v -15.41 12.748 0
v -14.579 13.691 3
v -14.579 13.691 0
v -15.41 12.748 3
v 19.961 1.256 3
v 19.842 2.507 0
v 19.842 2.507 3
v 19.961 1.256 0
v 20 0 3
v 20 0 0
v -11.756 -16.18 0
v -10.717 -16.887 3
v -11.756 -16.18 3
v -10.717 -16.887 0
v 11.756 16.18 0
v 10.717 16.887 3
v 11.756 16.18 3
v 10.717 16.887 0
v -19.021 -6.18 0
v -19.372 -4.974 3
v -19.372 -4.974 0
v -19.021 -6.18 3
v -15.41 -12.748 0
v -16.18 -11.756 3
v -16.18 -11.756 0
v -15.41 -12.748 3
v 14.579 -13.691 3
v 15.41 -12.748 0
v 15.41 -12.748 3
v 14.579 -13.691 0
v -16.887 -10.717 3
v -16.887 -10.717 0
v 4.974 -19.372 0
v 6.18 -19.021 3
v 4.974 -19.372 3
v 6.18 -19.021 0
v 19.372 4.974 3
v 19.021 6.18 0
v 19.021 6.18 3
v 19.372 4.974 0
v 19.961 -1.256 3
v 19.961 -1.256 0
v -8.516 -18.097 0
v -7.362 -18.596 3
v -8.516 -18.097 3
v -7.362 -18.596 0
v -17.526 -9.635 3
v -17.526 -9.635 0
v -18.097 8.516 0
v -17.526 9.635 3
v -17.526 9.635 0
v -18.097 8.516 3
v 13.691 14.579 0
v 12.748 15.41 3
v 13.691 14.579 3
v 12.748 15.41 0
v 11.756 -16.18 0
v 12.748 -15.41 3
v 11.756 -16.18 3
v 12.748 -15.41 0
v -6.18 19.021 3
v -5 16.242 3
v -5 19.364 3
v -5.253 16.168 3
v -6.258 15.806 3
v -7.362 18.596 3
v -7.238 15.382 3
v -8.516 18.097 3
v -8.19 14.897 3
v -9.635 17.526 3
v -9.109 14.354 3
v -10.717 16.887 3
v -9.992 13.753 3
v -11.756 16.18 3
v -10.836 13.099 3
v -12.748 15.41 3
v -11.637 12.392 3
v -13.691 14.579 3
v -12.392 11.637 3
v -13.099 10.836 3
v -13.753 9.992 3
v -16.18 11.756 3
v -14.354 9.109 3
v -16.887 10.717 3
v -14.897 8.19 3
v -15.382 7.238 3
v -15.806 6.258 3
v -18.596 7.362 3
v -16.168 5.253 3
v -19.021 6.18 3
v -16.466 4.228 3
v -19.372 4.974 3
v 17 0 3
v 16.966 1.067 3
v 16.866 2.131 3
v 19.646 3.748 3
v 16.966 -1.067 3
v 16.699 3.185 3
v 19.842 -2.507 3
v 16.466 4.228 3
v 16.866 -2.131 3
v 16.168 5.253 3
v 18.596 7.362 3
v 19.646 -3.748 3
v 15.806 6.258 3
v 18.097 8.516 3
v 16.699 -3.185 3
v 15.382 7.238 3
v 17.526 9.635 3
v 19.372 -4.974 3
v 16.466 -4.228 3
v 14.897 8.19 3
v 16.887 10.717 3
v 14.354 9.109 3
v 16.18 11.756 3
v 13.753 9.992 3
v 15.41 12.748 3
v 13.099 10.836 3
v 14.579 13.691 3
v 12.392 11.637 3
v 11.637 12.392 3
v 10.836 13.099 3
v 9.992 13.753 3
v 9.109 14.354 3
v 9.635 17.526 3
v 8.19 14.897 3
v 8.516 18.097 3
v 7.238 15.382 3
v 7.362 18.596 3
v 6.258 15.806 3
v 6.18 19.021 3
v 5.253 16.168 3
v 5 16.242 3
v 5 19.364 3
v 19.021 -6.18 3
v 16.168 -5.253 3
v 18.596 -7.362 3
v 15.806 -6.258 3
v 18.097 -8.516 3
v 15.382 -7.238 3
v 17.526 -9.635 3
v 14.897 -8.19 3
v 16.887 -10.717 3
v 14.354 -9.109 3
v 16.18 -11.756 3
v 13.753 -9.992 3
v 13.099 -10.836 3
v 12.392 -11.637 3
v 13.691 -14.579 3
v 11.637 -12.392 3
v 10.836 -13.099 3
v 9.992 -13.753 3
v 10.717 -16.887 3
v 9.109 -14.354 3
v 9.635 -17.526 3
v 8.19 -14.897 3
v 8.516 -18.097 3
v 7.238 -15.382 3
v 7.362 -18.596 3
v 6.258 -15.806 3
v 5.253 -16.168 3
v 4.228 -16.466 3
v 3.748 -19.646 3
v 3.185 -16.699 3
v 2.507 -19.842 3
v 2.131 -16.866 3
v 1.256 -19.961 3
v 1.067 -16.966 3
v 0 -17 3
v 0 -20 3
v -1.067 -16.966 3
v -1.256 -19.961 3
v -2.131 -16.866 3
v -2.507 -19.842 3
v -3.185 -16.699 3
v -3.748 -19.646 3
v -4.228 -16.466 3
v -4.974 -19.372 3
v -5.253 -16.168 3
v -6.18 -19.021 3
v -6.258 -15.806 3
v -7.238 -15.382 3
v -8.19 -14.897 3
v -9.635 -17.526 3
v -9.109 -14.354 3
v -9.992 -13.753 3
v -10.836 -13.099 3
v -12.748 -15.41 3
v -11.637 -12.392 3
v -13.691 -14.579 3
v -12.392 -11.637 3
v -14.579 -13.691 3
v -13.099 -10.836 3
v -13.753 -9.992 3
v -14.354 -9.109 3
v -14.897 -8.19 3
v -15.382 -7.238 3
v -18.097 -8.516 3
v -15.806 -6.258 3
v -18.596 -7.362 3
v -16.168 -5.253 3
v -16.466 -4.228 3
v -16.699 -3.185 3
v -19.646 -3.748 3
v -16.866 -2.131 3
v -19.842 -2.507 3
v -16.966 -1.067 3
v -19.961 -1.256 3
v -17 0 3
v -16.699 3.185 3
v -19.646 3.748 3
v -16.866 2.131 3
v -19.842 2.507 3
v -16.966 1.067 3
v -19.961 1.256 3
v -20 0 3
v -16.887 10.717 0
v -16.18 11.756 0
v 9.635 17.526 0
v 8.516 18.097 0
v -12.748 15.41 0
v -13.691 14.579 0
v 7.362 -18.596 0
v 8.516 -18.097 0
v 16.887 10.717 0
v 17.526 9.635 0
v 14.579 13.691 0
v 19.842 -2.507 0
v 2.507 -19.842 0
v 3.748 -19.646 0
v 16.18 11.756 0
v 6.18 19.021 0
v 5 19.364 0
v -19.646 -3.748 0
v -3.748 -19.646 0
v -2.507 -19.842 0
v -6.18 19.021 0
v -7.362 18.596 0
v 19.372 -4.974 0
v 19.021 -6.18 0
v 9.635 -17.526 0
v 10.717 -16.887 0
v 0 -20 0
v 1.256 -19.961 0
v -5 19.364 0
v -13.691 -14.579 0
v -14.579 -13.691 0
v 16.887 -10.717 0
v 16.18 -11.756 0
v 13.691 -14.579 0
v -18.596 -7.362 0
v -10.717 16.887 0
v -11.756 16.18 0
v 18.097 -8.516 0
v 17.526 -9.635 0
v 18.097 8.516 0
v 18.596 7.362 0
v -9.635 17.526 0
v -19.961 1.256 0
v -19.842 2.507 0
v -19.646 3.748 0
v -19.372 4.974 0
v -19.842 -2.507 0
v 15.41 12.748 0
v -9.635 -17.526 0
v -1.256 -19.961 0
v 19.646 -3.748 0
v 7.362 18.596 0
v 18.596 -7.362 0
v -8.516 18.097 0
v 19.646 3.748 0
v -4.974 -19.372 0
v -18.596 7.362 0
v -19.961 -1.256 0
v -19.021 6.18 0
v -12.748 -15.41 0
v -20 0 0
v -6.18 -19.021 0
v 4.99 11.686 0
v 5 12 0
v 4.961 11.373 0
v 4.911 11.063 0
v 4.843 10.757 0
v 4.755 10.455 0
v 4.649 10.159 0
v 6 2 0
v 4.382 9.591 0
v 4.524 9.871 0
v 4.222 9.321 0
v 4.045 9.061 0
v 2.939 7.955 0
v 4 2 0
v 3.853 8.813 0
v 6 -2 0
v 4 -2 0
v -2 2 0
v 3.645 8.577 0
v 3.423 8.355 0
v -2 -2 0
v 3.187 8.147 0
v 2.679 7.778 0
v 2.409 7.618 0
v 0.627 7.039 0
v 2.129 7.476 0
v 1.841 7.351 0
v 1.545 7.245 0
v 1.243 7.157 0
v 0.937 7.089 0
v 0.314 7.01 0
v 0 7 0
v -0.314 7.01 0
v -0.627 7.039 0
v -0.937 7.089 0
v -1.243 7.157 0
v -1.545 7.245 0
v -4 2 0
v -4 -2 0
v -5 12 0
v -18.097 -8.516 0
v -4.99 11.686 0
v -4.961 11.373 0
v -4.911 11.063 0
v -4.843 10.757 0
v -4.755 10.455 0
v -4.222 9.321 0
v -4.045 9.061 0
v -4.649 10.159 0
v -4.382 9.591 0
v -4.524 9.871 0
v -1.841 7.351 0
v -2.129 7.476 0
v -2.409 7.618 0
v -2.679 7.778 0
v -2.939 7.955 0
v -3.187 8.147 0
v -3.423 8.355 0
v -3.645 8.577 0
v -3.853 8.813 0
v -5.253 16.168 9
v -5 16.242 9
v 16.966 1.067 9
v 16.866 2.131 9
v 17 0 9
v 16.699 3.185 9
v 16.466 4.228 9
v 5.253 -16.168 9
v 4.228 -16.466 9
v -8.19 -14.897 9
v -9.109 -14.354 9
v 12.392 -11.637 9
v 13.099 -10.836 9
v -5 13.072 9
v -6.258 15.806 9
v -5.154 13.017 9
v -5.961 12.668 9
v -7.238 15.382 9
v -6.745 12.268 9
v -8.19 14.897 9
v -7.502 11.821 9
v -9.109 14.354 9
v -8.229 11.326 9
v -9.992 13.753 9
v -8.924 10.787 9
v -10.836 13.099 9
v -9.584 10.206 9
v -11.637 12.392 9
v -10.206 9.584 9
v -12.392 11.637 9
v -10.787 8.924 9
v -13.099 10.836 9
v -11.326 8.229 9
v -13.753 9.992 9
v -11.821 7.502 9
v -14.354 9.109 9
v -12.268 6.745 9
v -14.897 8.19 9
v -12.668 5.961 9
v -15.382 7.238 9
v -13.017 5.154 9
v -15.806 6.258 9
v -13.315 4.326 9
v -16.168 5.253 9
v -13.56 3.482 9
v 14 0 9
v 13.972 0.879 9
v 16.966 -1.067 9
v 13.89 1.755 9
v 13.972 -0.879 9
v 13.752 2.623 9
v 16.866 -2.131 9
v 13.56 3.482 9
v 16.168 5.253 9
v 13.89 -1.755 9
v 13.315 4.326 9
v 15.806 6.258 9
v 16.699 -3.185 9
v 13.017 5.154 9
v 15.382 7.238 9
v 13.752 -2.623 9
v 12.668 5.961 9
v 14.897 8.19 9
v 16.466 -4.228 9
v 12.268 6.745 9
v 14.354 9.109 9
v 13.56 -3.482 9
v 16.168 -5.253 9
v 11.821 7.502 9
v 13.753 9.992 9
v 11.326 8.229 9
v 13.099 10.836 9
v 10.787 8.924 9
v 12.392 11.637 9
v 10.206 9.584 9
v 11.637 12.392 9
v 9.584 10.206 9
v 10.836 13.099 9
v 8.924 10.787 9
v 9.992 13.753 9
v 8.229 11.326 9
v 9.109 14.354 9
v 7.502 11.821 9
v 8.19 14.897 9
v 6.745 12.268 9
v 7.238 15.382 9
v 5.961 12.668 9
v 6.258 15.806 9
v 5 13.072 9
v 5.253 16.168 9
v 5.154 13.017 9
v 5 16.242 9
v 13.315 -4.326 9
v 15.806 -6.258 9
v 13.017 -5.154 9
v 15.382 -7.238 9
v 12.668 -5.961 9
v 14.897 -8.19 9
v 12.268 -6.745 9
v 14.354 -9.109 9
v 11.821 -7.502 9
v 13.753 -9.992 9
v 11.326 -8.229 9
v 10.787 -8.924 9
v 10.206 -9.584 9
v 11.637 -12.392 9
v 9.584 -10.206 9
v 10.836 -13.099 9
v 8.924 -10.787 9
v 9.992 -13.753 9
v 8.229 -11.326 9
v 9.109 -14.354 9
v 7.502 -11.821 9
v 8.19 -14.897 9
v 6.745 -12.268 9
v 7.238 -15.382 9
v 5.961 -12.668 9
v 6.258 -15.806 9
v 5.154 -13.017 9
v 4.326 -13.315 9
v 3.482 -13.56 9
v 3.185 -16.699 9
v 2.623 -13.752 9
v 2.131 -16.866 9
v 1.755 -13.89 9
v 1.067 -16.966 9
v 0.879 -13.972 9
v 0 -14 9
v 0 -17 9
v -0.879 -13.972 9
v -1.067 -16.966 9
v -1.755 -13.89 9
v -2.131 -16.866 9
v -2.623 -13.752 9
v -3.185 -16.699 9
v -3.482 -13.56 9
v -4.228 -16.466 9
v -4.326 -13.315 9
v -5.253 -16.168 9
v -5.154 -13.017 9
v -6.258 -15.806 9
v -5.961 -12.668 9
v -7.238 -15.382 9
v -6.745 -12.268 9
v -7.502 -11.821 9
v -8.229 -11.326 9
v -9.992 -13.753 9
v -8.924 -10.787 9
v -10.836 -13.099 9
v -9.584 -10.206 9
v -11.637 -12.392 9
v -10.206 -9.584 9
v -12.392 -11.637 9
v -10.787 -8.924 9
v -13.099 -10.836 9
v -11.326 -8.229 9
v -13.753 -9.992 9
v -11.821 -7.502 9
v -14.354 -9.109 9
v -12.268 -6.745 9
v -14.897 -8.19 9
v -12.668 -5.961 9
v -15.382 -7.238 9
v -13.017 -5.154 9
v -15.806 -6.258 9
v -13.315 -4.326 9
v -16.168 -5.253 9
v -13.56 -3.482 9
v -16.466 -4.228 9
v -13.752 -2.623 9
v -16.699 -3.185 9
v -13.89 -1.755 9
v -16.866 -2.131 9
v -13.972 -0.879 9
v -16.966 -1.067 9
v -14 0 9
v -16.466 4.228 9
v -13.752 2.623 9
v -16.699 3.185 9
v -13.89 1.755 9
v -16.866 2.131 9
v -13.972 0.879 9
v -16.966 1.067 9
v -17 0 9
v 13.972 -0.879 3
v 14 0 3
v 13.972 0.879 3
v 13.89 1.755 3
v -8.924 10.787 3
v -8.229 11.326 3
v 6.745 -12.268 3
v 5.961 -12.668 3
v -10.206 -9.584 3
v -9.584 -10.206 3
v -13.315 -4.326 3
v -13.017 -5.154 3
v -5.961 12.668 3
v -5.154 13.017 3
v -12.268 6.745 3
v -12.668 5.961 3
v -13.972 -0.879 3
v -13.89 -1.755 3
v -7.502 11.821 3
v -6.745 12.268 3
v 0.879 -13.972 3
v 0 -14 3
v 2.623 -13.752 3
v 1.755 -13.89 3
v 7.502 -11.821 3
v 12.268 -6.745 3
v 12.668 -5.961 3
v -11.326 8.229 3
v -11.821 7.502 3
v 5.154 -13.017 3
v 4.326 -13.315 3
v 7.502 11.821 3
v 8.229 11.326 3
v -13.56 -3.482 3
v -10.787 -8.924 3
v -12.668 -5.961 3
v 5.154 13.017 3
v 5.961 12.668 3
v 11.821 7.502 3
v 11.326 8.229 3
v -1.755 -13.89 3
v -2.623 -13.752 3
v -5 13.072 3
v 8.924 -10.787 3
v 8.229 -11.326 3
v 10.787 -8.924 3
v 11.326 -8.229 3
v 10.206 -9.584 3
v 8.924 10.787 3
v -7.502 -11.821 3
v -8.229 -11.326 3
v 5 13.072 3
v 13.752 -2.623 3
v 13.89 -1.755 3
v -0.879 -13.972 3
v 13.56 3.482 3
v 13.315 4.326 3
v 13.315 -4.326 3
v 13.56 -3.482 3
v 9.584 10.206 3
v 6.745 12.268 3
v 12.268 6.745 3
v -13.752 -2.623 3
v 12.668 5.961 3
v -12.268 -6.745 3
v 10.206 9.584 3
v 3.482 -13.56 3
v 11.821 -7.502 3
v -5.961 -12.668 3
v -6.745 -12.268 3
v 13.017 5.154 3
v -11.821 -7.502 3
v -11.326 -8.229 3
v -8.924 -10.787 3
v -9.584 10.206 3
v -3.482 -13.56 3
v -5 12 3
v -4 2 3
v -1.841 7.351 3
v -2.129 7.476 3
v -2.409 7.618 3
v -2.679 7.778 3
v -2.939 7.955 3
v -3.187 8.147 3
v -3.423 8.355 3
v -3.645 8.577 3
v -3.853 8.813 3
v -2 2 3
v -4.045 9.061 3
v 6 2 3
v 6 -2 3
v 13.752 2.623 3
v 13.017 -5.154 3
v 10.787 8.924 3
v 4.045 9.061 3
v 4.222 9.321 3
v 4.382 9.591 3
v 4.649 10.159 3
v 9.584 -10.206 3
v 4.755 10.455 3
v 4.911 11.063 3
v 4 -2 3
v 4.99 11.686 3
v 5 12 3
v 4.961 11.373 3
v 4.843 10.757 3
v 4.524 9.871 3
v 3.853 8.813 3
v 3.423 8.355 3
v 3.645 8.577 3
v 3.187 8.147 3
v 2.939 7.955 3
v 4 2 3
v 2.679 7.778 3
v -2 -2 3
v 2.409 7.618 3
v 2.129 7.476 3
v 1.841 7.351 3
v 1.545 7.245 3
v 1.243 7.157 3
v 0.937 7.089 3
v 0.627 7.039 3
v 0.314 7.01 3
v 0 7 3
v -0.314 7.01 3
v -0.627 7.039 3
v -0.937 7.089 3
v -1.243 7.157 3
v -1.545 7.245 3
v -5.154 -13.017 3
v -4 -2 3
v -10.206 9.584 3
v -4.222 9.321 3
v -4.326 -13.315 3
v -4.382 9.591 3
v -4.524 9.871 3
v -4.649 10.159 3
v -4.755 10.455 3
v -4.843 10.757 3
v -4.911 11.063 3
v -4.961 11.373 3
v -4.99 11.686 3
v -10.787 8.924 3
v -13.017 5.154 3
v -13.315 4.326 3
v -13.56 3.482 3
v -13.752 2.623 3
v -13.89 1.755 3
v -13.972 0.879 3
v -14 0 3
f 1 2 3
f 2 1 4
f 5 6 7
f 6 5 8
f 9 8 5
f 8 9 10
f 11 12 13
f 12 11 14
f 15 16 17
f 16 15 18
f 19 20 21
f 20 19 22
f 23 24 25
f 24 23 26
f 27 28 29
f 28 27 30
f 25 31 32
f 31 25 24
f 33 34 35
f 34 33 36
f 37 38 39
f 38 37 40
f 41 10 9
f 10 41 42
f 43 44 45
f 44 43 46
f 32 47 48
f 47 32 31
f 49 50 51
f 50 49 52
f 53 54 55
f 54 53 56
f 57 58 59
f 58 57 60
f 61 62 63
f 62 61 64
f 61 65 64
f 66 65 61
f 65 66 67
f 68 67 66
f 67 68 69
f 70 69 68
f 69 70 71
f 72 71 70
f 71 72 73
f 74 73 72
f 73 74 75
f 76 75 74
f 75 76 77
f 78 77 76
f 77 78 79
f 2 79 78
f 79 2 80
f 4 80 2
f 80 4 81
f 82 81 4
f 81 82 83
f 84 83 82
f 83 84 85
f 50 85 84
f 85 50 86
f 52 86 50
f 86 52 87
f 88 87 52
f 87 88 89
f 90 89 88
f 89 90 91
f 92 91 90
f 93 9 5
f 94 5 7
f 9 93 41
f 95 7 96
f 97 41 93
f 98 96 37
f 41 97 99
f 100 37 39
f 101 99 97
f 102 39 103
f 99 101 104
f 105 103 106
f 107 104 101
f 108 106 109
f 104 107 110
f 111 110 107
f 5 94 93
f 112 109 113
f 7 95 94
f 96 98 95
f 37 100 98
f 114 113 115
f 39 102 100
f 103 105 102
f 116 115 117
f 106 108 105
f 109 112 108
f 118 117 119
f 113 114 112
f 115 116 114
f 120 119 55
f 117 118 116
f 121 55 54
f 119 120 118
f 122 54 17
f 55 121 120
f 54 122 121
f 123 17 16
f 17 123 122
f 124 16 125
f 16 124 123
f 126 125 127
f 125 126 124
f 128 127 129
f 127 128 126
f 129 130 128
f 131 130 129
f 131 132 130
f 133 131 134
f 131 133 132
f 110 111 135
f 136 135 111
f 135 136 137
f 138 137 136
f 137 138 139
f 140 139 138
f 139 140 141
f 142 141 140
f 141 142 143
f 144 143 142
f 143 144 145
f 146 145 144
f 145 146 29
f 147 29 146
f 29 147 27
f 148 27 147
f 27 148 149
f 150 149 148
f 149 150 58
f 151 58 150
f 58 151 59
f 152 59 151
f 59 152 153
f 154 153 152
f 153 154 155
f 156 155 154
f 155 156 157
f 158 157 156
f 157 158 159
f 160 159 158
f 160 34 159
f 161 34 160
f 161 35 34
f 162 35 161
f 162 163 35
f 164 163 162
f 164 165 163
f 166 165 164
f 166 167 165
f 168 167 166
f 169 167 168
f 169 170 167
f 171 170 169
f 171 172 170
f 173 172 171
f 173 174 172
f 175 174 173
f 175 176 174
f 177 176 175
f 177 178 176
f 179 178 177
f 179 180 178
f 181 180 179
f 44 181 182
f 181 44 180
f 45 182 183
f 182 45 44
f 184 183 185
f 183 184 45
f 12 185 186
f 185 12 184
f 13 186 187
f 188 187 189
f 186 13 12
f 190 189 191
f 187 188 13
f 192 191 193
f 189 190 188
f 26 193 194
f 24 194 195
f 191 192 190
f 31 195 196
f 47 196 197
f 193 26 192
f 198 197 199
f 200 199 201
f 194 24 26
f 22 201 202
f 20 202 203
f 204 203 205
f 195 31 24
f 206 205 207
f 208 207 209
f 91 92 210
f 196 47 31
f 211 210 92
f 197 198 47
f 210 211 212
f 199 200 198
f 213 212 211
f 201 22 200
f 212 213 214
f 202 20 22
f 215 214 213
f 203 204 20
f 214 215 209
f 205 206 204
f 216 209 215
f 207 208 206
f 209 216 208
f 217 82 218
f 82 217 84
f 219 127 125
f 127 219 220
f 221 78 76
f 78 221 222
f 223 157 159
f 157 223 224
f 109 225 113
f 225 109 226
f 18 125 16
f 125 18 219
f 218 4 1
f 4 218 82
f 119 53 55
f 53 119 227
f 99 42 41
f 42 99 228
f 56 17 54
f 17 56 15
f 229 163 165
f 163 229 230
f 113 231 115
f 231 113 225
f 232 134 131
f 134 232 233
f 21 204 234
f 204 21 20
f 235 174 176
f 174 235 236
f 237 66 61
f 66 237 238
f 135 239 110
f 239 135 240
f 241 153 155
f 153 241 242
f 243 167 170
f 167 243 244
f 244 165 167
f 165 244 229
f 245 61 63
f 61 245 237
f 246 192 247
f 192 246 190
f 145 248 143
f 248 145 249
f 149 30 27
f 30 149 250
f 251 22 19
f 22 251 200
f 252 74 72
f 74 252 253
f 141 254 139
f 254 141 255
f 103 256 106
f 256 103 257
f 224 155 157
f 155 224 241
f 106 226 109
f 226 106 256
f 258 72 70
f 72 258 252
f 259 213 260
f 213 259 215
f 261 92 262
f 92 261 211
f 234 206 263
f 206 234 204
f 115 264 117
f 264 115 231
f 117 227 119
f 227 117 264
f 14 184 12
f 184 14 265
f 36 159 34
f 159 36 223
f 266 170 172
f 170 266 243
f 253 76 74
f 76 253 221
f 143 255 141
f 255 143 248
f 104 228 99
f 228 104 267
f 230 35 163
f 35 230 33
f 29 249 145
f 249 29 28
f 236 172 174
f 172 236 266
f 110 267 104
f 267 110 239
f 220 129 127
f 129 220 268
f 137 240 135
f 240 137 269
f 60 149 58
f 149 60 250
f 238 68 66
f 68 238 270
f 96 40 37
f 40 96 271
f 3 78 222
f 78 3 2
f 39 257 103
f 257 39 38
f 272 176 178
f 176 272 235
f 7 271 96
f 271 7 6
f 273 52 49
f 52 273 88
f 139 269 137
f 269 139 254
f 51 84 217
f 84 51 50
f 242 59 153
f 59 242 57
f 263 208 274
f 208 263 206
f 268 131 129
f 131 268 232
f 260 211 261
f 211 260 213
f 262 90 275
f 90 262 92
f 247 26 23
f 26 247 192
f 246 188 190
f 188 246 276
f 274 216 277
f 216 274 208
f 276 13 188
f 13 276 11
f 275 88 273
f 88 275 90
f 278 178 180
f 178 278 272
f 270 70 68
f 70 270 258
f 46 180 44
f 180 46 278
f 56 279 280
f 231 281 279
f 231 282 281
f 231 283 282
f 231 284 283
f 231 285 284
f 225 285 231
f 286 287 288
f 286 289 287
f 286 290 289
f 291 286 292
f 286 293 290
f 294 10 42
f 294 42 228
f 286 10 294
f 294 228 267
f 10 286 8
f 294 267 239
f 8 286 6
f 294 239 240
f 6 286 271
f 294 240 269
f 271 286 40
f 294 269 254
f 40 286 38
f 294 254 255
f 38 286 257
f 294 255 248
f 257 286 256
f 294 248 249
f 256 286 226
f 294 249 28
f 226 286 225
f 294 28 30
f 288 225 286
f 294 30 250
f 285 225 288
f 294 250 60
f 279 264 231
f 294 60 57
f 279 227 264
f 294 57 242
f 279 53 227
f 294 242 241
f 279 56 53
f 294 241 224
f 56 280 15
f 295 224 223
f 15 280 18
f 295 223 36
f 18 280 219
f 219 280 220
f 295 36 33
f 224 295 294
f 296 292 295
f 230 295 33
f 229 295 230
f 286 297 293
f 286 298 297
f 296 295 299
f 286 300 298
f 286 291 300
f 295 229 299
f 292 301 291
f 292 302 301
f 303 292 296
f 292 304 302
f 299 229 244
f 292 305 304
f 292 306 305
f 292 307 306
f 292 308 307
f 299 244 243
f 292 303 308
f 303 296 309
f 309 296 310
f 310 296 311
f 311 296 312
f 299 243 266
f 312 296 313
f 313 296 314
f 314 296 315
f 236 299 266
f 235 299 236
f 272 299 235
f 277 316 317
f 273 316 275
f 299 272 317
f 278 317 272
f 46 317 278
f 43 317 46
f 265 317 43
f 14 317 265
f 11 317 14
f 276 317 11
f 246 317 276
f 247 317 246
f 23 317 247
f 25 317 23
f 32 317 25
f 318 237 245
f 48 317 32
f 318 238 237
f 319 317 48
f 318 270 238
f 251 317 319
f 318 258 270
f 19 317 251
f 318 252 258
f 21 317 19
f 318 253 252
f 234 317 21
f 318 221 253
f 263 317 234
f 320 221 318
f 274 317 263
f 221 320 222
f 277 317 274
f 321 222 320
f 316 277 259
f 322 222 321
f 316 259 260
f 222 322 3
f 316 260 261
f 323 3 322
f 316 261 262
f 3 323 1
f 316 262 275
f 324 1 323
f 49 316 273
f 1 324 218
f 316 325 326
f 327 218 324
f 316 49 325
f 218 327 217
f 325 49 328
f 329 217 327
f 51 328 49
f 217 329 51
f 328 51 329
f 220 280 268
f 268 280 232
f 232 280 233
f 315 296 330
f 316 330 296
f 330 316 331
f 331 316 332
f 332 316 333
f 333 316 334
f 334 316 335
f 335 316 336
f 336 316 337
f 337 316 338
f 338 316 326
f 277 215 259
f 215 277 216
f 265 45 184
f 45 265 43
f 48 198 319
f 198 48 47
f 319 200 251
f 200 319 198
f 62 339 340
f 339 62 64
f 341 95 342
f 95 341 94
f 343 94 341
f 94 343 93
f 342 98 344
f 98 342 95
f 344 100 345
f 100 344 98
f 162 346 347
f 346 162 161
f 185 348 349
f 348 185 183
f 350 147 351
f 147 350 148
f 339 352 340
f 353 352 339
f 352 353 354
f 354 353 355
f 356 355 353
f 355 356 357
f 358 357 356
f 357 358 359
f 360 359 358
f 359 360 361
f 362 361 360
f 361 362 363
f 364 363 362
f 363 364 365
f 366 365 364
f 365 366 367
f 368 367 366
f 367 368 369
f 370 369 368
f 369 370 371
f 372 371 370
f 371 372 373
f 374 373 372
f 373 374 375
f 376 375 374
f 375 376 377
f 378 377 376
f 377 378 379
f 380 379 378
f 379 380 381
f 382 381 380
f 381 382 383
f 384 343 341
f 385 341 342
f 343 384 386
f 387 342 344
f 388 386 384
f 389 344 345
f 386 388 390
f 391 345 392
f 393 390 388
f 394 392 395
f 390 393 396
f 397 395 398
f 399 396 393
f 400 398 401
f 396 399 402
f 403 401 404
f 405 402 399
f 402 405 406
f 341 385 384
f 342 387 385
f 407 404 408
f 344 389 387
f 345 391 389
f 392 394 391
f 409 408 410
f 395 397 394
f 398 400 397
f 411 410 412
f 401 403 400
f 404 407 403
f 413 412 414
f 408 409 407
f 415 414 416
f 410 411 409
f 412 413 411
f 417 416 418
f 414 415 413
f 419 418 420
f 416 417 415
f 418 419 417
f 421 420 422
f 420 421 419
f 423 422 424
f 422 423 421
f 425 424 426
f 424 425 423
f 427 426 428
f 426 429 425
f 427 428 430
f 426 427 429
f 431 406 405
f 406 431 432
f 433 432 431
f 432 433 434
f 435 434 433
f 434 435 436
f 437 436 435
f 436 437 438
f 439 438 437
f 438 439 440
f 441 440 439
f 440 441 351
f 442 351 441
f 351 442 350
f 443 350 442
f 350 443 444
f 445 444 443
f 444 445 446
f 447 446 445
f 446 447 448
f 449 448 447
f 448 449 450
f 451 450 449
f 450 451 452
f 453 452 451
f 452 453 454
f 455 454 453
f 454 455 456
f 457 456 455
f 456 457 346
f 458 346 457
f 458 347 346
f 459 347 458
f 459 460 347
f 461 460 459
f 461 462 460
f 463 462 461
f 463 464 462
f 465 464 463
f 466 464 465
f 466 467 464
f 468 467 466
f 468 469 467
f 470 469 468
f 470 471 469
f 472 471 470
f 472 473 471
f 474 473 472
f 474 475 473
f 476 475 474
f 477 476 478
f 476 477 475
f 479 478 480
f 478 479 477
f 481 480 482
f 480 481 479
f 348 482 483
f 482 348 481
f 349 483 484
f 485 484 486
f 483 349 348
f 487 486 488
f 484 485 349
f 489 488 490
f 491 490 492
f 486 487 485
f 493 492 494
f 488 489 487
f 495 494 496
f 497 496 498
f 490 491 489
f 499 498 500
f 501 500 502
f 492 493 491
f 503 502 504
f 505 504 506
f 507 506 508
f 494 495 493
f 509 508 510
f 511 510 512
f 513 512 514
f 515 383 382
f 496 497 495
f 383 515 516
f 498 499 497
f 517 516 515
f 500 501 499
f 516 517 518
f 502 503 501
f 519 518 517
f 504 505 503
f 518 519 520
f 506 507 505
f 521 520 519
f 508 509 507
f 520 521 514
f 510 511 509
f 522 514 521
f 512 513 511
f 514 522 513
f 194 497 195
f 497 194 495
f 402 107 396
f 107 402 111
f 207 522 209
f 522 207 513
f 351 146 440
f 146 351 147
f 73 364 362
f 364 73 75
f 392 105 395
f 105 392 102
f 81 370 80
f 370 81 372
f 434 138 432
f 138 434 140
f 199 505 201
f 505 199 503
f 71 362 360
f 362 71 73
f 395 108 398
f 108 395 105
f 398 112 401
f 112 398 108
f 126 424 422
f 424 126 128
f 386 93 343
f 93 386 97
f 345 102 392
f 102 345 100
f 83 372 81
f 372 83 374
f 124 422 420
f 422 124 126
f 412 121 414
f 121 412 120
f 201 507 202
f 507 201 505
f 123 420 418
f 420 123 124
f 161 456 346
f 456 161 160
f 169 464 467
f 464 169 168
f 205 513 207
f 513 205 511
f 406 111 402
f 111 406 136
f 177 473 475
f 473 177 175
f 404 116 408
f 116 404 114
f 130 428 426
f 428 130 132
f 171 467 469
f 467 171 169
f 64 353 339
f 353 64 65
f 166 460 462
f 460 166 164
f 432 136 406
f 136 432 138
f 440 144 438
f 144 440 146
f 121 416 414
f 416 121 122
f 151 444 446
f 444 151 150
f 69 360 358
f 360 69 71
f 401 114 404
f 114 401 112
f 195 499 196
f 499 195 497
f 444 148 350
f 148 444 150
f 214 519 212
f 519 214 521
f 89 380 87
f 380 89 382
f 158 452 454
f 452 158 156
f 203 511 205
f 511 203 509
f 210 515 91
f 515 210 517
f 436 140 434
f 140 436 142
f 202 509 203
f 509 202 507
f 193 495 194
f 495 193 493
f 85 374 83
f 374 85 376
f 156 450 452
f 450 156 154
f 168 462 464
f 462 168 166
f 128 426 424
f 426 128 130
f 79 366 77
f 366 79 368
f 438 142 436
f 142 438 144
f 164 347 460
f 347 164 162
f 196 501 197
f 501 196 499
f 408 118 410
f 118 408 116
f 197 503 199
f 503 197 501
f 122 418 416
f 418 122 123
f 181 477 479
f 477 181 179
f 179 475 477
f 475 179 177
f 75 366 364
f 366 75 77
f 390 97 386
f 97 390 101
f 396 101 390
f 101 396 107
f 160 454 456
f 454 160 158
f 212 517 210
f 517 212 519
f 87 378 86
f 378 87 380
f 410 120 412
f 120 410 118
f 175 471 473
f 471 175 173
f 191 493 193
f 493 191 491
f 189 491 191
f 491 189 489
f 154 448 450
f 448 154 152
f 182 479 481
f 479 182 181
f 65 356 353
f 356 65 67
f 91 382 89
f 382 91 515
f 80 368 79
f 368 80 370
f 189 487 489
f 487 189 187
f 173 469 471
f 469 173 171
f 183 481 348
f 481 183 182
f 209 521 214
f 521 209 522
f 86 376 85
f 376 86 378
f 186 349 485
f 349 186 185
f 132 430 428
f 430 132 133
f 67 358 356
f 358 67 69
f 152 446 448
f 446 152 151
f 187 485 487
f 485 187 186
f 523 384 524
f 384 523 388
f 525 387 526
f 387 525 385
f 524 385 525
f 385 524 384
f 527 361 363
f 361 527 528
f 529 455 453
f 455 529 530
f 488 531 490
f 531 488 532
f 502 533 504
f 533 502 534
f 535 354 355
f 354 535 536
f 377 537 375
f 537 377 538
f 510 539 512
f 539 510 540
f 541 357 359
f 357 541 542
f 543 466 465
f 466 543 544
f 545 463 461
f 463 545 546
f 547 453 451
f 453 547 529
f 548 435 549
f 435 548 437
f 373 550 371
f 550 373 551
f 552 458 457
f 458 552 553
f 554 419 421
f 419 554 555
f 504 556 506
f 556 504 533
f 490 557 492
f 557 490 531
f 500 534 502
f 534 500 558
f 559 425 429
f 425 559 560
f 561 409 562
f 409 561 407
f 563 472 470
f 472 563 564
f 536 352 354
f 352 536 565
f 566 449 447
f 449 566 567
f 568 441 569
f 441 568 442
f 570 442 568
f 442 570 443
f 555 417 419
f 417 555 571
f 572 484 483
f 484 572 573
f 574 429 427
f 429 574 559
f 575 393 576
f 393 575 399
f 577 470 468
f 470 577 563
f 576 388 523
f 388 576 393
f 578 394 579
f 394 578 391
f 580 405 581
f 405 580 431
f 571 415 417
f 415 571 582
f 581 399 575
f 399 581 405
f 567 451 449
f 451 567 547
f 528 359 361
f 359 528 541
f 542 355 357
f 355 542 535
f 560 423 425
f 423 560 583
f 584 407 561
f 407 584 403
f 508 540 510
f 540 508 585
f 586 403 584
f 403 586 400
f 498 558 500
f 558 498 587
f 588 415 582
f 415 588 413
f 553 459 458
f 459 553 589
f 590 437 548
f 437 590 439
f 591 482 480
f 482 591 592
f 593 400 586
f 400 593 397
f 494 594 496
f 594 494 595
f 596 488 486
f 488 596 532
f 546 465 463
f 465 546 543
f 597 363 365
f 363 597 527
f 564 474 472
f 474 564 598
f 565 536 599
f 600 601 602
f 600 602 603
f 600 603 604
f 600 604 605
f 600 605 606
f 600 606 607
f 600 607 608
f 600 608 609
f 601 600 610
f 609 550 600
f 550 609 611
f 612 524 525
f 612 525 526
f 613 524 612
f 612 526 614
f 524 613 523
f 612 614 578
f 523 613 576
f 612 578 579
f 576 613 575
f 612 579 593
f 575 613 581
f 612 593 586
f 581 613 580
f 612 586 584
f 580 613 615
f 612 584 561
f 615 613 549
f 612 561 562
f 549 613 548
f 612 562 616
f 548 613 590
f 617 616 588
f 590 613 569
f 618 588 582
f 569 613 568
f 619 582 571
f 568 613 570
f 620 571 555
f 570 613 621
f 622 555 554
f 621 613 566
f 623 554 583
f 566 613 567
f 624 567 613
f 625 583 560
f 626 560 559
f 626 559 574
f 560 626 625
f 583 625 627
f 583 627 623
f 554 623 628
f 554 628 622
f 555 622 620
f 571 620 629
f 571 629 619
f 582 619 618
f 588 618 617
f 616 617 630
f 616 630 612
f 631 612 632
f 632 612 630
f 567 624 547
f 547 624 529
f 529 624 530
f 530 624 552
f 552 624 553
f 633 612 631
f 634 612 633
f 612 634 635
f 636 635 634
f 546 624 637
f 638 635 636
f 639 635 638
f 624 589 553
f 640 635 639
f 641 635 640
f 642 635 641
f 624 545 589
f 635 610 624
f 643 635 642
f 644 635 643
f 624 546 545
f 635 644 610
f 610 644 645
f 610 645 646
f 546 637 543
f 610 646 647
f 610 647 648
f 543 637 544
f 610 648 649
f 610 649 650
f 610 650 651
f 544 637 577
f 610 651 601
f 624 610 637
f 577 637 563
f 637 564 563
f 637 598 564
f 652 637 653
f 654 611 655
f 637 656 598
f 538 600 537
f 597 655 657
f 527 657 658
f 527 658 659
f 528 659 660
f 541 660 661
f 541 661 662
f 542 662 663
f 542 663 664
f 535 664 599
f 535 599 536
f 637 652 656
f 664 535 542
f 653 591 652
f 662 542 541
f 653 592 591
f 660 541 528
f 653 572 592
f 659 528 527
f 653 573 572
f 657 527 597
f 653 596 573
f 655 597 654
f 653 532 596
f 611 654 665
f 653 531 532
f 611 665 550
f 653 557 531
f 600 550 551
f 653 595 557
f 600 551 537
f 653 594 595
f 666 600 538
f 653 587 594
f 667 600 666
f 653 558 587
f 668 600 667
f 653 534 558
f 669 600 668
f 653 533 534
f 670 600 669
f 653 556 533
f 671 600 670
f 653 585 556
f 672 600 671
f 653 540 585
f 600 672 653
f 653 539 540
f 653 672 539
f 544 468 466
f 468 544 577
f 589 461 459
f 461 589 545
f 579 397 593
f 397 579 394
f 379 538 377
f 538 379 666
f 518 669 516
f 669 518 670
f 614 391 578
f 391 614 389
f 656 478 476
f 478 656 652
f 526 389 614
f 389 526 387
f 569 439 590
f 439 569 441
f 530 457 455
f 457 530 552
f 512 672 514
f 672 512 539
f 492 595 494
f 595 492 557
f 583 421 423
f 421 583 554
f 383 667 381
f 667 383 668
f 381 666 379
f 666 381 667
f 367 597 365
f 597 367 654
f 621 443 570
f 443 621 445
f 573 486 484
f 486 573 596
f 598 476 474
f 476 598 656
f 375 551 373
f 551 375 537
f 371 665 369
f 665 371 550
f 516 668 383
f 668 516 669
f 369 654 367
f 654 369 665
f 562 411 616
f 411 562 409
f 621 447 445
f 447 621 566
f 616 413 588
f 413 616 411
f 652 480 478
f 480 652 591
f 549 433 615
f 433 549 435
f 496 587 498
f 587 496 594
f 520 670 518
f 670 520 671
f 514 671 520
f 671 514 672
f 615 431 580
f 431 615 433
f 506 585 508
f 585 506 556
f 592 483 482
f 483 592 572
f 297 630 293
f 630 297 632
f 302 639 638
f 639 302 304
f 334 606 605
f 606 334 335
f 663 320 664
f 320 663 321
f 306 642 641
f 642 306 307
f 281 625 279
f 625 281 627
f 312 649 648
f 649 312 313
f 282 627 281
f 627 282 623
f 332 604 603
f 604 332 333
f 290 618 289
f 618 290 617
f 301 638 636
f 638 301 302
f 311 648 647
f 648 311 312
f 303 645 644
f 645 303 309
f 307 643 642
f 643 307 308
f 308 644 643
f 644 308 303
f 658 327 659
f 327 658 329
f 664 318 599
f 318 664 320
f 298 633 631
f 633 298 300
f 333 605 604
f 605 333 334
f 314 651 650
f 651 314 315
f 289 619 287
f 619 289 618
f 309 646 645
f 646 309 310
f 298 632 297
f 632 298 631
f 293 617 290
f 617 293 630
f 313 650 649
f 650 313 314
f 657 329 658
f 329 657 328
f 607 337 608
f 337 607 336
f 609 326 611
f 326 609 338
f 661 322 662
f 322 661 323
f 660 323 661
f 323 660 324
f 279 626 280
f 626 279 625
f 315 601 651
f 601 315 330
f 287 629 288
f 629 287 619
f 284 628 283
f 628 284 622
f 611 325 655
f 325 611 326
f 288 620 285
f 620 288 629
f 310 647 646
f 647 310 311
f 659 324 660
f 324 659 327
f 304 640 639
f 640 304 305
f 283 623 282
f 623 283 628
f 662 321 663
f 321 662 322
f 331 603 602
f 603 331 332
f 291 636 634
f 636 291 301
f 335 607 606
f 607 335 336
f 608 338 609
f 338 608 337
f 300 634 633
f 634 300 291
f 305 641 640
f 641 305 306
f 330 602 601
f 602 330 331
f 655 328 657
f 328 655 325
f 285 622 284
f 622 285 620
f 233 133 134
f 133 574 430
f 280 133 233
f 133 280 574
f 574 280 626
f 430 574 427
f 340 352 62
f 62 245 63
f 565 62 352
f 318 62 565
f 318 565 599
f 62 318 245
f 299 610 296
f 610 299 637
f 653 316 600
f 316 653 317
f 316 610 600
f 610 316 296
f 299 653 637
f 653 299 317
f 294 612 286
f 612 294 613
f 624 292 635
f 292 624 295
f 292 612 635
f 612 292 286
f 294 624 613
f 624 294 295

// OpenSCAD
lip_w = 3;
lip_h = 3;

ins_h = 6;
ins_w = 3;

d = 34;

h_h = 2.0;
h_w = 4.0;
h_d = 10;

c_d = 10;

fn = 100;

difference(){
    
    union(){
        
        cylinder( h = lip_h, d = d + 2 * lip_w, $fn = fn );
        cylinder( h = lip_h + ins_h, d = d, $fn = fn );
        
    }
    
    translate( [ 0, 0, lip_h ] )
        cylinder( h = ins_h + 1, d = d - 2 * ins_w, $fn = fn );
    
    translate( [ 0, ( d - c_d ) / 2, -1 ] )
        #cylinder( h = ins_h + lip_h + 2, d = c_d, $fn = fn );    
    translate( [ -c_d / 2, ( d - c_d ) / 2, -1 ] )
        cube( [ c_d, c_d + lip_w, ins_h + lip_h + 2 ]);    


    translate( [ -h_d / 2 + h_h / 2, -h_w / 2, -1 ] )
        cube( [ h_h, h_w, lip_h + 2 ]);
    translate( [ h_d / 2 - h_h / 2, -h_w / 2, -1 ] )
        cube( [ h_h, h_w, lip_h + 2 ]);
}
